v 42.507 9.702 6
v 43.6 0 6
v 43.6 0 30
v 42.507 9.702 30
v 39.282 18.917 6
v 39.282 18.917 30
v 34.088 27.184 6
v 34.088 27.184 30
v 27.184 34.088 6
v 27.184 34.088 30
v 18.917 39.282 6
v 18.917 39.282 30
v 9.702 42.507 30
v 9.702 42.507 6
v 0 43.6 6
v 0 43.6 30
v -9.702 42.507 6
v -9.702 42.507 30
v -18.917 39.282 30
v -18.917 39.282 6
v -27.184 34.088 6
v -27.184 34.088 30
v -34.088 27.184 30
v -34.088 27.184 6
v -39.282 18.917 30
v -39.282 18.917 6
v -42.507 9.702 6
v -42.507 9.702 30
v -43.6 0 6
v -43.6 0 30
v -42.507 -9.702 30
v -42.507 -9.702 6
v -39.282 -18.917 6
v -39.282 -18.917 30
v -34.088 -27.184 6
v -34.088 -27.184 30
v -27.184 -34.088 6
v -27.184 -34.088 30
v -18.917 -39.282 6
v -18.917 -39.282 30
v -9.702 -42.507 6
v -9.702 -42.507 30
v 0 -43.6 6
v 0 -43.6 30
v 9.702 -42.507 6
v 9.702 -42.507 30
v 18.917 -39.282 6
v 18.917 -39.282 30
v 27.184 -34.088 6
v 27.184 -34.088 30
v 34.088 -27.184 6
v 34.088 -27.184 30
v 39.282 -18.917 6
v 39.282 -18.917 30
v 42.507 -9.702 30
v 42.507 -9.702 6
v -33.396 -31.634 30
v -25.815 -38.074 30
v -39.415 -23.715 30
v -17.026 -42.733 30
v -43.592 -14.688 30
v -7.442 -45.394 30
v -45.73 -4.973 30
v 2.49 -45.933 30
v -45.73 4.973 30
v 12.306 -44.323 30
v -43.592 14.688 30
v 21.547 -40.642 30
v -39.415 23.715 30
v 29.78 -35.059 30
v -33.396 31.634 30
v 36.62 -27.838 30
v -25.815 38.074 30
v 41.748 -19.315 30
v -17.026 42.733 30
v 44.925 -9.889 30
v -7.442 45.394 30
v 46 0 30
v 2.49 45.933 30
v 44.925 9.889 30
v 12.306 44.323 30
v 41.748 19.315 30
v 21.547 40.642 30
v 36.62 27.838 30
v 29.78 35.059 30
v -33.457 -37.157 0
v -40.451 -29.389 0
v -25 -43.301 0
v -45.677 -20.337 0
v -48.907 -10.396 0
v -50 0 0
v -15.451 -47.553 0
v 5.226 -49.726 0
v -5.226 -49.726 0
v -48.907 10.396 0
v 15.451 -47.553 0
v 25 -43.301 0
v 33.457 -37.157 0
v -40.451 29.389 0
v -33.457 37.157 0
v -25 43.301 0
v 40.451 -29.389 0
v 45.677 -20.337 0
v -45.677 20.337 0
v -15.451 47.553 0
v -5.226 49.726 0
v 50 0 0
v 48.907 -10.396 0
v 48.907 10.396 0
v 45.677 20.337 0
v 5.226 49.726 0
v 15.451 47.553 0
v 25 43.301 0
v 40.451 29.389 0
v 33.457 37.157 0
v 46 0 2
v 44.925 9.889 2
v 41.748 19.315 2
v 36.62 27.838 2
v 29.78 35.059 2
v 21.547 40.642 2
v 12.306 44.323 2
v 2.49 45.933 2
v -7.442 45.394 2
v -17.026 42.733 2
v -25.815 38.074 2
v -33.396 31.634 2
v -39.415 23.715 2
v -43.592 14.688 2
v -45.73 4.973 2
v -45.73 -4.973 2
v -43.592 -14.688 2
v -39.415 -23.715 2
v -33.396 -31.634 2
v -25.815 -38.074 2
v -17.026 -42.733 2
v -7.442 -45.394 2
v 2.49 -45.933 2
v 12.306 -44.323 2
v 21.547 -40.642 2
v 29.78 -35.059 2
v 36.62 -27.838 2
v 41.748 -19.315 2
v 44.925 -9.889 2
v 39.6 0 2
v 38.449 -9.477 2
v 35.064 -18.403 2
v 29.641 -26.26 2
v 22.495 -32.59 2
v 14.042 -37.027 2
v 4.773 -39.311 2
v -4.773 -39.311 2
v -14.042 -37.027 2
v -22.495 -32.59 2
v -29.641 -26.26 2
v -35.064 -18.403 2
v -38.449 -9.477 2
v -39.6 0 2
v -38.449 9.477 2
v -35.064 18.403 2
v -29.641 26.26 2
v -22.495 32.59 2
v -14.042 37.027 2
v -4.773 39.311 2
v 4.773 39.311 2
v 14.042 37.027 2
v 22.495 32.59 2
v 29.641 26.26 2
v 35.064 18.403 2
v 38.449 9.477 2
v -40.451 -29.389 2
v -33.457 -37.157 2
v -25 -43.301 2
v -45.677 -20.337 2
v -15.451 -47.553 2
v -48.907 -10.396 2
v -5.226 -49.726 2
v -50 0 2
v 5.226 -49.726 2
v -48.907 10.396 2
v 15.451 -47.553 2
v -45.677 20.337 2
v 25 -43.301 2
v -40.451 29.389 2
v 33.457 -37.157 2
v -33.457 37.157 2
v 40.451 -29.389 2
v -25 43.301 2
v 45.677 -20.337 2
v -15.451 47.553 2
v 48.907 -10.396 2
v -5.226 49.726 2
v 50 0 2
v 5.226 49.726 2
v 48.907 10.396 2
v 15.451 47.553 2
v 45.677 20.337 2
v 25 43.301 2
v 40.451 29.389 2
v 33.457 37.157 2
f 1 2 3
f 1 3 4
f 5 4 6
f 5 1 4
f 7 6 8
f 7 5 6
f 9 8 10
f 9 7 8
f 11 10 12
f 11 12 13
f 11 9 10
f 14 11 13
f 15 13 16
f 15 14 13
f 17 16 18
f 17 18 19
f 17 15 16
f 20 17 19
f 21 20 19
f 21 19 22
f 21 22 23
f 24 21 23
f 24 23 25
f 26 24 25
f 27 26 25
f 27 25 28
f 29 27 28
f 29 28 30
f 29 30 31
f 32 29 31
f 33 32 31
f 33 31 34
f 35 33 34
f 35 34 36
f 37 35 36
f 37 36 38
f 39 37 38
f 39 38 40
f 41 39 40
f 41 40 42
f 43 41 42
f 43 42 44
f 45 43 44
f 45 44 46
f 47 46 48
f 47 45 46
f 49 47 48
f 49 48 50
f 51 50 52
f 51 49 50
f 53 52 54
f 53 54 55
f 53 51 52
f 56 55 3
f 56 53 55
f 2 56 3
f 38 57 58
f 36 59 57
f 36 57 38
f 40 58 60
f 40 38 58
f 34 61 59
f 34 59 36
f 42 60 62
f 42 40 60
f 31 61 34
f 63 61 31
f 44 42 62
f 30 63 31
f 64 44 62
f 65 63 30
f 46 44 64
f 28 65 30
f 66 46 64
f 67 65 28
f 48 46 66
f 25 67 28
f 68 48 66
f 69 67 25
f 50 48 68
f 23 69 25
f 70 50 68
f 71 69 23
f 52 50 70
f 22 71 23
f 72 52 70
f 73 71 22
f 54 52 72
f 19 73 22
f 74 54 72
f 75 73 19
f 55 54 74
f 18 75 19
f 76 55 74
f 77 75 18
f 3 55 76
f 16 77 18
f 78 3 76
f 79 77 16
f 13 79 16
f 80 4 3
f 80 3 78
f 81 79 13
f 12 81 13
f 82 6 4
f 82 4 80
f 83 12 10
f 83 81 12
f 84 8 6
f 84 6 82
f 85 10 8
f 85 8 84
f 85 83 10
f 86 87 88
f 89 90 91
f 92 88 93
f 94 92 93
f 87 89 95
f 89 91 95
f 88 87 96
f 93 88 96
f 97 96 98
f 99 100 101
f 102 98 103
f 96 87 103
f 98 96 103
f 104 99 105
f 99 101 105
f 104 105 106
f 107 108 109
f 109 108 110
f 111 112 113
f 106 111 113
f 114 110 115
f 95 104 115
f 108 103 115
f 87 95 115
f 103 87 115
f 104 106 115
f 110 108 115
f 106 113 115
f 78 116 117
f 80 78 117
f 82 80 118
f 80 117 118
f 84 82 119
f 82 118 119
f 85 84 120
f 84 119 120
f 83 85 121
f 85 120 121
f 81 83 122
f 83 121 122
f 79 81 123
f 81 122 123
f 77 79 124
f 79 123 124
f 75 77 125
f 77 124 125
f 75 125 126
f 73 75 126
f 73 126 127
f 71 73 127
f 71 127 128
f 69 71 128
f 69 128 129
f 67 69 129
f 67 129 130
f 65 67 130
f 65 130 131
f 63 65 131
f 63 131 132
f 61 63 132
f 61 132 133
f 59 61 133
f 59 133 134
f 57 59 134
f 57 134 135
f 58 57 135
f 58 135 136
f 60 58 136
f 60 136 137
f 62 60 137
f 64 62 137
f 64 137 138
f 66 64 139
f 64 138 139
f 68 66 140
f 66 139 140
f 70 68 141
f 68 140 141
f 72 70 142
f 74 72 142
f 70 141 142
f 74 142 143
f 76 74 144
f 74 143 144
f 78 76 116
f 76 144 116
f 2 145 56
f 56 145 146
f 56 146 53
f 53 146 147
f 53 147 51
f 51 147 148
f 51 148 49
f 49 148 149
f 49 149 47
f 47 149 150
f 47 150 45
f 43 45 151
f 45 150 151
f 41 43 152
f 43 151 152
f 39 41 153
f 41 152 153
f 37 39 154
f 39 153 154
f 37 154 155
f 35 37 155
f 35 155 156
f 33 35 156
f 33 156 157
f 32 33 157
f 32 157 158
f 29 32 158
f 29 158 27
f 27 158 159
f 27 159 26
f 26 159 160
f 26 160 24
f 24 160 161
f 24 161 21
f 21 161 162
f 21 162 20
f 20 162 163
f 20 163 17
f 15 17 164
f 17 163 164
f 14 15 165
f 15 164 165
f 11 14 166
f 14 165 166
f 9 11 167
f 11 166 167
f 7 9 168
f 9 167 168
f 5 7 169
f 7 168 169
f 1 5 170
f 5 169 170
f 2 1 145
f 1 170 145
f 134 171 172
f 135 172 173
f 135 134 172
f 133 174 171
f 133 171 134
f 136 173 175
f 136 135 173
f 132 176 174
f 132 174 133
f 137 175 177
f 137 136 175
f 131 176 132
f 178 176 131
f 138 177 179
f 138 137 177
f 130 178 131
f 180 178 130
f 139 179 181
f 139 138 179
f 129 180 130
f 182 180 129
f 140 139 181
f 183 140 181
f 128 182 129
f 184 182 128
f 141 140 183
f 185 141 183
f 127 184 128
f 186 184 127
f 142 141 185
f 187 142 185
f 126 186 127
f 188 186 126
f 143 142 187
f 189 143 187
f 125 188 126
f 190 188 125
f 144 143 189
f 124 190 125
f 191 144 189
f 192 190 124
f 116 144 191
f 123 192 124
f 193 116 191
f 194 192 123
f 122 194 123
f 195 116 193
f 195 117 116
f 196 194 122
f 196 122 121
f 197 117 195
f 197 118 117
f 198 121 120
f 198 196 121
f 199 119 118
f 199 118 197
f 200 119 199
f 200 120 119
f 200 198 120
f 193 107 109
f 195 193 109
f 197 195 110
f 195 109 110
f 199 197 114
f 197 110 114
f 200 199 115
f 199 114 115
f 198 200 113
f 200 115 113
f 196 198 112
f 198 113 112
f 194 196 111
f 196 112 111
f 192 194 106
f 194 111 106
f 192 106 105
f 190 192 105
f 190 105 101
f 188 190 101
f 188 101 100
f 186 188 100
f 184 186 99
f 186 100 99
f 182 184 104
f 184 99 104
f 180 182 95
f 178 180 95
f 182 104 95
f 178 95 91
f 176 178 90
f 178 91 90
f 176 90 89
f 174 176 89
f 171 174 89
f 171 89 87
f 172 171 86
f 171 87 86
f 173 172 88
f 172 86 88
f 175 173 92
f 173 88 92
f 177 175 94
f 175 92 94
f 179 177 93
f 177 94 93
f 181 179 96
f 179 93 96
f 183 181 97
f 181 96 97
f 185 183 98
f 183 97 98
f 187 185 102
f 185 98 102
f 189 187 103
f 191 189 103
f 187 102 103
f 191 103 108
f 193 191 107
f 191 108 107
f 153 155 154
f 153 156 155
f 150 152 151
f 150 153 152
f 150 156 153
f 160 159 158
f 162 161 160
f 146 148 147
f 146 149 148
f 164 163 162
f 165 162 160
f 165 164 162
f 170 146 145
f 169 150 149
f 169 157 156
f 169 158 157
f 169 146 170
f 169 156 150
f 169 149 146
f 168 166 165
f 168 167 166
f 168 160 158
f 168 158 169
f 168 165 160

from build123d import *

# Parameters (mm, degrees)
F0_R     = 50
F0_R_2   = 46
F0_R_3   = 43.6
F1_DEPTH = 2
F2_DEPTH = 30
F3_SIZE  = 4


with BuildPart() as f1:
    # F0 (on Top) → F1 (new body)
    with BuildSketch(Plane.XY):
        Circle(F0_R)
        Circle(F0_R_2, mode=Mode.SUBTRACT)
        Circle(F0_R_2)
        Circle(F0_R_3, mode=Mode.SUBTRACT)
        Circle(F0_R_3)
    extrude(amount=F1_DEPTH)

    # F0 (on Top) → F2 (join)
    with BuildSketch(Plane.XY):
        Circle(F0_R_2)
        Circle(F0_R_3, mode=Mode.SUBTRACT)
    extrude(amount=F2_DEPTH)

    # F3
    f3_edges = [f1.edges().sort_by_distance(p)[0] for p in [
        (-43.6, 0, 2),
    ]]
    chamfer(f3_edges, length=F3_SIZE)


solid = f1.part
